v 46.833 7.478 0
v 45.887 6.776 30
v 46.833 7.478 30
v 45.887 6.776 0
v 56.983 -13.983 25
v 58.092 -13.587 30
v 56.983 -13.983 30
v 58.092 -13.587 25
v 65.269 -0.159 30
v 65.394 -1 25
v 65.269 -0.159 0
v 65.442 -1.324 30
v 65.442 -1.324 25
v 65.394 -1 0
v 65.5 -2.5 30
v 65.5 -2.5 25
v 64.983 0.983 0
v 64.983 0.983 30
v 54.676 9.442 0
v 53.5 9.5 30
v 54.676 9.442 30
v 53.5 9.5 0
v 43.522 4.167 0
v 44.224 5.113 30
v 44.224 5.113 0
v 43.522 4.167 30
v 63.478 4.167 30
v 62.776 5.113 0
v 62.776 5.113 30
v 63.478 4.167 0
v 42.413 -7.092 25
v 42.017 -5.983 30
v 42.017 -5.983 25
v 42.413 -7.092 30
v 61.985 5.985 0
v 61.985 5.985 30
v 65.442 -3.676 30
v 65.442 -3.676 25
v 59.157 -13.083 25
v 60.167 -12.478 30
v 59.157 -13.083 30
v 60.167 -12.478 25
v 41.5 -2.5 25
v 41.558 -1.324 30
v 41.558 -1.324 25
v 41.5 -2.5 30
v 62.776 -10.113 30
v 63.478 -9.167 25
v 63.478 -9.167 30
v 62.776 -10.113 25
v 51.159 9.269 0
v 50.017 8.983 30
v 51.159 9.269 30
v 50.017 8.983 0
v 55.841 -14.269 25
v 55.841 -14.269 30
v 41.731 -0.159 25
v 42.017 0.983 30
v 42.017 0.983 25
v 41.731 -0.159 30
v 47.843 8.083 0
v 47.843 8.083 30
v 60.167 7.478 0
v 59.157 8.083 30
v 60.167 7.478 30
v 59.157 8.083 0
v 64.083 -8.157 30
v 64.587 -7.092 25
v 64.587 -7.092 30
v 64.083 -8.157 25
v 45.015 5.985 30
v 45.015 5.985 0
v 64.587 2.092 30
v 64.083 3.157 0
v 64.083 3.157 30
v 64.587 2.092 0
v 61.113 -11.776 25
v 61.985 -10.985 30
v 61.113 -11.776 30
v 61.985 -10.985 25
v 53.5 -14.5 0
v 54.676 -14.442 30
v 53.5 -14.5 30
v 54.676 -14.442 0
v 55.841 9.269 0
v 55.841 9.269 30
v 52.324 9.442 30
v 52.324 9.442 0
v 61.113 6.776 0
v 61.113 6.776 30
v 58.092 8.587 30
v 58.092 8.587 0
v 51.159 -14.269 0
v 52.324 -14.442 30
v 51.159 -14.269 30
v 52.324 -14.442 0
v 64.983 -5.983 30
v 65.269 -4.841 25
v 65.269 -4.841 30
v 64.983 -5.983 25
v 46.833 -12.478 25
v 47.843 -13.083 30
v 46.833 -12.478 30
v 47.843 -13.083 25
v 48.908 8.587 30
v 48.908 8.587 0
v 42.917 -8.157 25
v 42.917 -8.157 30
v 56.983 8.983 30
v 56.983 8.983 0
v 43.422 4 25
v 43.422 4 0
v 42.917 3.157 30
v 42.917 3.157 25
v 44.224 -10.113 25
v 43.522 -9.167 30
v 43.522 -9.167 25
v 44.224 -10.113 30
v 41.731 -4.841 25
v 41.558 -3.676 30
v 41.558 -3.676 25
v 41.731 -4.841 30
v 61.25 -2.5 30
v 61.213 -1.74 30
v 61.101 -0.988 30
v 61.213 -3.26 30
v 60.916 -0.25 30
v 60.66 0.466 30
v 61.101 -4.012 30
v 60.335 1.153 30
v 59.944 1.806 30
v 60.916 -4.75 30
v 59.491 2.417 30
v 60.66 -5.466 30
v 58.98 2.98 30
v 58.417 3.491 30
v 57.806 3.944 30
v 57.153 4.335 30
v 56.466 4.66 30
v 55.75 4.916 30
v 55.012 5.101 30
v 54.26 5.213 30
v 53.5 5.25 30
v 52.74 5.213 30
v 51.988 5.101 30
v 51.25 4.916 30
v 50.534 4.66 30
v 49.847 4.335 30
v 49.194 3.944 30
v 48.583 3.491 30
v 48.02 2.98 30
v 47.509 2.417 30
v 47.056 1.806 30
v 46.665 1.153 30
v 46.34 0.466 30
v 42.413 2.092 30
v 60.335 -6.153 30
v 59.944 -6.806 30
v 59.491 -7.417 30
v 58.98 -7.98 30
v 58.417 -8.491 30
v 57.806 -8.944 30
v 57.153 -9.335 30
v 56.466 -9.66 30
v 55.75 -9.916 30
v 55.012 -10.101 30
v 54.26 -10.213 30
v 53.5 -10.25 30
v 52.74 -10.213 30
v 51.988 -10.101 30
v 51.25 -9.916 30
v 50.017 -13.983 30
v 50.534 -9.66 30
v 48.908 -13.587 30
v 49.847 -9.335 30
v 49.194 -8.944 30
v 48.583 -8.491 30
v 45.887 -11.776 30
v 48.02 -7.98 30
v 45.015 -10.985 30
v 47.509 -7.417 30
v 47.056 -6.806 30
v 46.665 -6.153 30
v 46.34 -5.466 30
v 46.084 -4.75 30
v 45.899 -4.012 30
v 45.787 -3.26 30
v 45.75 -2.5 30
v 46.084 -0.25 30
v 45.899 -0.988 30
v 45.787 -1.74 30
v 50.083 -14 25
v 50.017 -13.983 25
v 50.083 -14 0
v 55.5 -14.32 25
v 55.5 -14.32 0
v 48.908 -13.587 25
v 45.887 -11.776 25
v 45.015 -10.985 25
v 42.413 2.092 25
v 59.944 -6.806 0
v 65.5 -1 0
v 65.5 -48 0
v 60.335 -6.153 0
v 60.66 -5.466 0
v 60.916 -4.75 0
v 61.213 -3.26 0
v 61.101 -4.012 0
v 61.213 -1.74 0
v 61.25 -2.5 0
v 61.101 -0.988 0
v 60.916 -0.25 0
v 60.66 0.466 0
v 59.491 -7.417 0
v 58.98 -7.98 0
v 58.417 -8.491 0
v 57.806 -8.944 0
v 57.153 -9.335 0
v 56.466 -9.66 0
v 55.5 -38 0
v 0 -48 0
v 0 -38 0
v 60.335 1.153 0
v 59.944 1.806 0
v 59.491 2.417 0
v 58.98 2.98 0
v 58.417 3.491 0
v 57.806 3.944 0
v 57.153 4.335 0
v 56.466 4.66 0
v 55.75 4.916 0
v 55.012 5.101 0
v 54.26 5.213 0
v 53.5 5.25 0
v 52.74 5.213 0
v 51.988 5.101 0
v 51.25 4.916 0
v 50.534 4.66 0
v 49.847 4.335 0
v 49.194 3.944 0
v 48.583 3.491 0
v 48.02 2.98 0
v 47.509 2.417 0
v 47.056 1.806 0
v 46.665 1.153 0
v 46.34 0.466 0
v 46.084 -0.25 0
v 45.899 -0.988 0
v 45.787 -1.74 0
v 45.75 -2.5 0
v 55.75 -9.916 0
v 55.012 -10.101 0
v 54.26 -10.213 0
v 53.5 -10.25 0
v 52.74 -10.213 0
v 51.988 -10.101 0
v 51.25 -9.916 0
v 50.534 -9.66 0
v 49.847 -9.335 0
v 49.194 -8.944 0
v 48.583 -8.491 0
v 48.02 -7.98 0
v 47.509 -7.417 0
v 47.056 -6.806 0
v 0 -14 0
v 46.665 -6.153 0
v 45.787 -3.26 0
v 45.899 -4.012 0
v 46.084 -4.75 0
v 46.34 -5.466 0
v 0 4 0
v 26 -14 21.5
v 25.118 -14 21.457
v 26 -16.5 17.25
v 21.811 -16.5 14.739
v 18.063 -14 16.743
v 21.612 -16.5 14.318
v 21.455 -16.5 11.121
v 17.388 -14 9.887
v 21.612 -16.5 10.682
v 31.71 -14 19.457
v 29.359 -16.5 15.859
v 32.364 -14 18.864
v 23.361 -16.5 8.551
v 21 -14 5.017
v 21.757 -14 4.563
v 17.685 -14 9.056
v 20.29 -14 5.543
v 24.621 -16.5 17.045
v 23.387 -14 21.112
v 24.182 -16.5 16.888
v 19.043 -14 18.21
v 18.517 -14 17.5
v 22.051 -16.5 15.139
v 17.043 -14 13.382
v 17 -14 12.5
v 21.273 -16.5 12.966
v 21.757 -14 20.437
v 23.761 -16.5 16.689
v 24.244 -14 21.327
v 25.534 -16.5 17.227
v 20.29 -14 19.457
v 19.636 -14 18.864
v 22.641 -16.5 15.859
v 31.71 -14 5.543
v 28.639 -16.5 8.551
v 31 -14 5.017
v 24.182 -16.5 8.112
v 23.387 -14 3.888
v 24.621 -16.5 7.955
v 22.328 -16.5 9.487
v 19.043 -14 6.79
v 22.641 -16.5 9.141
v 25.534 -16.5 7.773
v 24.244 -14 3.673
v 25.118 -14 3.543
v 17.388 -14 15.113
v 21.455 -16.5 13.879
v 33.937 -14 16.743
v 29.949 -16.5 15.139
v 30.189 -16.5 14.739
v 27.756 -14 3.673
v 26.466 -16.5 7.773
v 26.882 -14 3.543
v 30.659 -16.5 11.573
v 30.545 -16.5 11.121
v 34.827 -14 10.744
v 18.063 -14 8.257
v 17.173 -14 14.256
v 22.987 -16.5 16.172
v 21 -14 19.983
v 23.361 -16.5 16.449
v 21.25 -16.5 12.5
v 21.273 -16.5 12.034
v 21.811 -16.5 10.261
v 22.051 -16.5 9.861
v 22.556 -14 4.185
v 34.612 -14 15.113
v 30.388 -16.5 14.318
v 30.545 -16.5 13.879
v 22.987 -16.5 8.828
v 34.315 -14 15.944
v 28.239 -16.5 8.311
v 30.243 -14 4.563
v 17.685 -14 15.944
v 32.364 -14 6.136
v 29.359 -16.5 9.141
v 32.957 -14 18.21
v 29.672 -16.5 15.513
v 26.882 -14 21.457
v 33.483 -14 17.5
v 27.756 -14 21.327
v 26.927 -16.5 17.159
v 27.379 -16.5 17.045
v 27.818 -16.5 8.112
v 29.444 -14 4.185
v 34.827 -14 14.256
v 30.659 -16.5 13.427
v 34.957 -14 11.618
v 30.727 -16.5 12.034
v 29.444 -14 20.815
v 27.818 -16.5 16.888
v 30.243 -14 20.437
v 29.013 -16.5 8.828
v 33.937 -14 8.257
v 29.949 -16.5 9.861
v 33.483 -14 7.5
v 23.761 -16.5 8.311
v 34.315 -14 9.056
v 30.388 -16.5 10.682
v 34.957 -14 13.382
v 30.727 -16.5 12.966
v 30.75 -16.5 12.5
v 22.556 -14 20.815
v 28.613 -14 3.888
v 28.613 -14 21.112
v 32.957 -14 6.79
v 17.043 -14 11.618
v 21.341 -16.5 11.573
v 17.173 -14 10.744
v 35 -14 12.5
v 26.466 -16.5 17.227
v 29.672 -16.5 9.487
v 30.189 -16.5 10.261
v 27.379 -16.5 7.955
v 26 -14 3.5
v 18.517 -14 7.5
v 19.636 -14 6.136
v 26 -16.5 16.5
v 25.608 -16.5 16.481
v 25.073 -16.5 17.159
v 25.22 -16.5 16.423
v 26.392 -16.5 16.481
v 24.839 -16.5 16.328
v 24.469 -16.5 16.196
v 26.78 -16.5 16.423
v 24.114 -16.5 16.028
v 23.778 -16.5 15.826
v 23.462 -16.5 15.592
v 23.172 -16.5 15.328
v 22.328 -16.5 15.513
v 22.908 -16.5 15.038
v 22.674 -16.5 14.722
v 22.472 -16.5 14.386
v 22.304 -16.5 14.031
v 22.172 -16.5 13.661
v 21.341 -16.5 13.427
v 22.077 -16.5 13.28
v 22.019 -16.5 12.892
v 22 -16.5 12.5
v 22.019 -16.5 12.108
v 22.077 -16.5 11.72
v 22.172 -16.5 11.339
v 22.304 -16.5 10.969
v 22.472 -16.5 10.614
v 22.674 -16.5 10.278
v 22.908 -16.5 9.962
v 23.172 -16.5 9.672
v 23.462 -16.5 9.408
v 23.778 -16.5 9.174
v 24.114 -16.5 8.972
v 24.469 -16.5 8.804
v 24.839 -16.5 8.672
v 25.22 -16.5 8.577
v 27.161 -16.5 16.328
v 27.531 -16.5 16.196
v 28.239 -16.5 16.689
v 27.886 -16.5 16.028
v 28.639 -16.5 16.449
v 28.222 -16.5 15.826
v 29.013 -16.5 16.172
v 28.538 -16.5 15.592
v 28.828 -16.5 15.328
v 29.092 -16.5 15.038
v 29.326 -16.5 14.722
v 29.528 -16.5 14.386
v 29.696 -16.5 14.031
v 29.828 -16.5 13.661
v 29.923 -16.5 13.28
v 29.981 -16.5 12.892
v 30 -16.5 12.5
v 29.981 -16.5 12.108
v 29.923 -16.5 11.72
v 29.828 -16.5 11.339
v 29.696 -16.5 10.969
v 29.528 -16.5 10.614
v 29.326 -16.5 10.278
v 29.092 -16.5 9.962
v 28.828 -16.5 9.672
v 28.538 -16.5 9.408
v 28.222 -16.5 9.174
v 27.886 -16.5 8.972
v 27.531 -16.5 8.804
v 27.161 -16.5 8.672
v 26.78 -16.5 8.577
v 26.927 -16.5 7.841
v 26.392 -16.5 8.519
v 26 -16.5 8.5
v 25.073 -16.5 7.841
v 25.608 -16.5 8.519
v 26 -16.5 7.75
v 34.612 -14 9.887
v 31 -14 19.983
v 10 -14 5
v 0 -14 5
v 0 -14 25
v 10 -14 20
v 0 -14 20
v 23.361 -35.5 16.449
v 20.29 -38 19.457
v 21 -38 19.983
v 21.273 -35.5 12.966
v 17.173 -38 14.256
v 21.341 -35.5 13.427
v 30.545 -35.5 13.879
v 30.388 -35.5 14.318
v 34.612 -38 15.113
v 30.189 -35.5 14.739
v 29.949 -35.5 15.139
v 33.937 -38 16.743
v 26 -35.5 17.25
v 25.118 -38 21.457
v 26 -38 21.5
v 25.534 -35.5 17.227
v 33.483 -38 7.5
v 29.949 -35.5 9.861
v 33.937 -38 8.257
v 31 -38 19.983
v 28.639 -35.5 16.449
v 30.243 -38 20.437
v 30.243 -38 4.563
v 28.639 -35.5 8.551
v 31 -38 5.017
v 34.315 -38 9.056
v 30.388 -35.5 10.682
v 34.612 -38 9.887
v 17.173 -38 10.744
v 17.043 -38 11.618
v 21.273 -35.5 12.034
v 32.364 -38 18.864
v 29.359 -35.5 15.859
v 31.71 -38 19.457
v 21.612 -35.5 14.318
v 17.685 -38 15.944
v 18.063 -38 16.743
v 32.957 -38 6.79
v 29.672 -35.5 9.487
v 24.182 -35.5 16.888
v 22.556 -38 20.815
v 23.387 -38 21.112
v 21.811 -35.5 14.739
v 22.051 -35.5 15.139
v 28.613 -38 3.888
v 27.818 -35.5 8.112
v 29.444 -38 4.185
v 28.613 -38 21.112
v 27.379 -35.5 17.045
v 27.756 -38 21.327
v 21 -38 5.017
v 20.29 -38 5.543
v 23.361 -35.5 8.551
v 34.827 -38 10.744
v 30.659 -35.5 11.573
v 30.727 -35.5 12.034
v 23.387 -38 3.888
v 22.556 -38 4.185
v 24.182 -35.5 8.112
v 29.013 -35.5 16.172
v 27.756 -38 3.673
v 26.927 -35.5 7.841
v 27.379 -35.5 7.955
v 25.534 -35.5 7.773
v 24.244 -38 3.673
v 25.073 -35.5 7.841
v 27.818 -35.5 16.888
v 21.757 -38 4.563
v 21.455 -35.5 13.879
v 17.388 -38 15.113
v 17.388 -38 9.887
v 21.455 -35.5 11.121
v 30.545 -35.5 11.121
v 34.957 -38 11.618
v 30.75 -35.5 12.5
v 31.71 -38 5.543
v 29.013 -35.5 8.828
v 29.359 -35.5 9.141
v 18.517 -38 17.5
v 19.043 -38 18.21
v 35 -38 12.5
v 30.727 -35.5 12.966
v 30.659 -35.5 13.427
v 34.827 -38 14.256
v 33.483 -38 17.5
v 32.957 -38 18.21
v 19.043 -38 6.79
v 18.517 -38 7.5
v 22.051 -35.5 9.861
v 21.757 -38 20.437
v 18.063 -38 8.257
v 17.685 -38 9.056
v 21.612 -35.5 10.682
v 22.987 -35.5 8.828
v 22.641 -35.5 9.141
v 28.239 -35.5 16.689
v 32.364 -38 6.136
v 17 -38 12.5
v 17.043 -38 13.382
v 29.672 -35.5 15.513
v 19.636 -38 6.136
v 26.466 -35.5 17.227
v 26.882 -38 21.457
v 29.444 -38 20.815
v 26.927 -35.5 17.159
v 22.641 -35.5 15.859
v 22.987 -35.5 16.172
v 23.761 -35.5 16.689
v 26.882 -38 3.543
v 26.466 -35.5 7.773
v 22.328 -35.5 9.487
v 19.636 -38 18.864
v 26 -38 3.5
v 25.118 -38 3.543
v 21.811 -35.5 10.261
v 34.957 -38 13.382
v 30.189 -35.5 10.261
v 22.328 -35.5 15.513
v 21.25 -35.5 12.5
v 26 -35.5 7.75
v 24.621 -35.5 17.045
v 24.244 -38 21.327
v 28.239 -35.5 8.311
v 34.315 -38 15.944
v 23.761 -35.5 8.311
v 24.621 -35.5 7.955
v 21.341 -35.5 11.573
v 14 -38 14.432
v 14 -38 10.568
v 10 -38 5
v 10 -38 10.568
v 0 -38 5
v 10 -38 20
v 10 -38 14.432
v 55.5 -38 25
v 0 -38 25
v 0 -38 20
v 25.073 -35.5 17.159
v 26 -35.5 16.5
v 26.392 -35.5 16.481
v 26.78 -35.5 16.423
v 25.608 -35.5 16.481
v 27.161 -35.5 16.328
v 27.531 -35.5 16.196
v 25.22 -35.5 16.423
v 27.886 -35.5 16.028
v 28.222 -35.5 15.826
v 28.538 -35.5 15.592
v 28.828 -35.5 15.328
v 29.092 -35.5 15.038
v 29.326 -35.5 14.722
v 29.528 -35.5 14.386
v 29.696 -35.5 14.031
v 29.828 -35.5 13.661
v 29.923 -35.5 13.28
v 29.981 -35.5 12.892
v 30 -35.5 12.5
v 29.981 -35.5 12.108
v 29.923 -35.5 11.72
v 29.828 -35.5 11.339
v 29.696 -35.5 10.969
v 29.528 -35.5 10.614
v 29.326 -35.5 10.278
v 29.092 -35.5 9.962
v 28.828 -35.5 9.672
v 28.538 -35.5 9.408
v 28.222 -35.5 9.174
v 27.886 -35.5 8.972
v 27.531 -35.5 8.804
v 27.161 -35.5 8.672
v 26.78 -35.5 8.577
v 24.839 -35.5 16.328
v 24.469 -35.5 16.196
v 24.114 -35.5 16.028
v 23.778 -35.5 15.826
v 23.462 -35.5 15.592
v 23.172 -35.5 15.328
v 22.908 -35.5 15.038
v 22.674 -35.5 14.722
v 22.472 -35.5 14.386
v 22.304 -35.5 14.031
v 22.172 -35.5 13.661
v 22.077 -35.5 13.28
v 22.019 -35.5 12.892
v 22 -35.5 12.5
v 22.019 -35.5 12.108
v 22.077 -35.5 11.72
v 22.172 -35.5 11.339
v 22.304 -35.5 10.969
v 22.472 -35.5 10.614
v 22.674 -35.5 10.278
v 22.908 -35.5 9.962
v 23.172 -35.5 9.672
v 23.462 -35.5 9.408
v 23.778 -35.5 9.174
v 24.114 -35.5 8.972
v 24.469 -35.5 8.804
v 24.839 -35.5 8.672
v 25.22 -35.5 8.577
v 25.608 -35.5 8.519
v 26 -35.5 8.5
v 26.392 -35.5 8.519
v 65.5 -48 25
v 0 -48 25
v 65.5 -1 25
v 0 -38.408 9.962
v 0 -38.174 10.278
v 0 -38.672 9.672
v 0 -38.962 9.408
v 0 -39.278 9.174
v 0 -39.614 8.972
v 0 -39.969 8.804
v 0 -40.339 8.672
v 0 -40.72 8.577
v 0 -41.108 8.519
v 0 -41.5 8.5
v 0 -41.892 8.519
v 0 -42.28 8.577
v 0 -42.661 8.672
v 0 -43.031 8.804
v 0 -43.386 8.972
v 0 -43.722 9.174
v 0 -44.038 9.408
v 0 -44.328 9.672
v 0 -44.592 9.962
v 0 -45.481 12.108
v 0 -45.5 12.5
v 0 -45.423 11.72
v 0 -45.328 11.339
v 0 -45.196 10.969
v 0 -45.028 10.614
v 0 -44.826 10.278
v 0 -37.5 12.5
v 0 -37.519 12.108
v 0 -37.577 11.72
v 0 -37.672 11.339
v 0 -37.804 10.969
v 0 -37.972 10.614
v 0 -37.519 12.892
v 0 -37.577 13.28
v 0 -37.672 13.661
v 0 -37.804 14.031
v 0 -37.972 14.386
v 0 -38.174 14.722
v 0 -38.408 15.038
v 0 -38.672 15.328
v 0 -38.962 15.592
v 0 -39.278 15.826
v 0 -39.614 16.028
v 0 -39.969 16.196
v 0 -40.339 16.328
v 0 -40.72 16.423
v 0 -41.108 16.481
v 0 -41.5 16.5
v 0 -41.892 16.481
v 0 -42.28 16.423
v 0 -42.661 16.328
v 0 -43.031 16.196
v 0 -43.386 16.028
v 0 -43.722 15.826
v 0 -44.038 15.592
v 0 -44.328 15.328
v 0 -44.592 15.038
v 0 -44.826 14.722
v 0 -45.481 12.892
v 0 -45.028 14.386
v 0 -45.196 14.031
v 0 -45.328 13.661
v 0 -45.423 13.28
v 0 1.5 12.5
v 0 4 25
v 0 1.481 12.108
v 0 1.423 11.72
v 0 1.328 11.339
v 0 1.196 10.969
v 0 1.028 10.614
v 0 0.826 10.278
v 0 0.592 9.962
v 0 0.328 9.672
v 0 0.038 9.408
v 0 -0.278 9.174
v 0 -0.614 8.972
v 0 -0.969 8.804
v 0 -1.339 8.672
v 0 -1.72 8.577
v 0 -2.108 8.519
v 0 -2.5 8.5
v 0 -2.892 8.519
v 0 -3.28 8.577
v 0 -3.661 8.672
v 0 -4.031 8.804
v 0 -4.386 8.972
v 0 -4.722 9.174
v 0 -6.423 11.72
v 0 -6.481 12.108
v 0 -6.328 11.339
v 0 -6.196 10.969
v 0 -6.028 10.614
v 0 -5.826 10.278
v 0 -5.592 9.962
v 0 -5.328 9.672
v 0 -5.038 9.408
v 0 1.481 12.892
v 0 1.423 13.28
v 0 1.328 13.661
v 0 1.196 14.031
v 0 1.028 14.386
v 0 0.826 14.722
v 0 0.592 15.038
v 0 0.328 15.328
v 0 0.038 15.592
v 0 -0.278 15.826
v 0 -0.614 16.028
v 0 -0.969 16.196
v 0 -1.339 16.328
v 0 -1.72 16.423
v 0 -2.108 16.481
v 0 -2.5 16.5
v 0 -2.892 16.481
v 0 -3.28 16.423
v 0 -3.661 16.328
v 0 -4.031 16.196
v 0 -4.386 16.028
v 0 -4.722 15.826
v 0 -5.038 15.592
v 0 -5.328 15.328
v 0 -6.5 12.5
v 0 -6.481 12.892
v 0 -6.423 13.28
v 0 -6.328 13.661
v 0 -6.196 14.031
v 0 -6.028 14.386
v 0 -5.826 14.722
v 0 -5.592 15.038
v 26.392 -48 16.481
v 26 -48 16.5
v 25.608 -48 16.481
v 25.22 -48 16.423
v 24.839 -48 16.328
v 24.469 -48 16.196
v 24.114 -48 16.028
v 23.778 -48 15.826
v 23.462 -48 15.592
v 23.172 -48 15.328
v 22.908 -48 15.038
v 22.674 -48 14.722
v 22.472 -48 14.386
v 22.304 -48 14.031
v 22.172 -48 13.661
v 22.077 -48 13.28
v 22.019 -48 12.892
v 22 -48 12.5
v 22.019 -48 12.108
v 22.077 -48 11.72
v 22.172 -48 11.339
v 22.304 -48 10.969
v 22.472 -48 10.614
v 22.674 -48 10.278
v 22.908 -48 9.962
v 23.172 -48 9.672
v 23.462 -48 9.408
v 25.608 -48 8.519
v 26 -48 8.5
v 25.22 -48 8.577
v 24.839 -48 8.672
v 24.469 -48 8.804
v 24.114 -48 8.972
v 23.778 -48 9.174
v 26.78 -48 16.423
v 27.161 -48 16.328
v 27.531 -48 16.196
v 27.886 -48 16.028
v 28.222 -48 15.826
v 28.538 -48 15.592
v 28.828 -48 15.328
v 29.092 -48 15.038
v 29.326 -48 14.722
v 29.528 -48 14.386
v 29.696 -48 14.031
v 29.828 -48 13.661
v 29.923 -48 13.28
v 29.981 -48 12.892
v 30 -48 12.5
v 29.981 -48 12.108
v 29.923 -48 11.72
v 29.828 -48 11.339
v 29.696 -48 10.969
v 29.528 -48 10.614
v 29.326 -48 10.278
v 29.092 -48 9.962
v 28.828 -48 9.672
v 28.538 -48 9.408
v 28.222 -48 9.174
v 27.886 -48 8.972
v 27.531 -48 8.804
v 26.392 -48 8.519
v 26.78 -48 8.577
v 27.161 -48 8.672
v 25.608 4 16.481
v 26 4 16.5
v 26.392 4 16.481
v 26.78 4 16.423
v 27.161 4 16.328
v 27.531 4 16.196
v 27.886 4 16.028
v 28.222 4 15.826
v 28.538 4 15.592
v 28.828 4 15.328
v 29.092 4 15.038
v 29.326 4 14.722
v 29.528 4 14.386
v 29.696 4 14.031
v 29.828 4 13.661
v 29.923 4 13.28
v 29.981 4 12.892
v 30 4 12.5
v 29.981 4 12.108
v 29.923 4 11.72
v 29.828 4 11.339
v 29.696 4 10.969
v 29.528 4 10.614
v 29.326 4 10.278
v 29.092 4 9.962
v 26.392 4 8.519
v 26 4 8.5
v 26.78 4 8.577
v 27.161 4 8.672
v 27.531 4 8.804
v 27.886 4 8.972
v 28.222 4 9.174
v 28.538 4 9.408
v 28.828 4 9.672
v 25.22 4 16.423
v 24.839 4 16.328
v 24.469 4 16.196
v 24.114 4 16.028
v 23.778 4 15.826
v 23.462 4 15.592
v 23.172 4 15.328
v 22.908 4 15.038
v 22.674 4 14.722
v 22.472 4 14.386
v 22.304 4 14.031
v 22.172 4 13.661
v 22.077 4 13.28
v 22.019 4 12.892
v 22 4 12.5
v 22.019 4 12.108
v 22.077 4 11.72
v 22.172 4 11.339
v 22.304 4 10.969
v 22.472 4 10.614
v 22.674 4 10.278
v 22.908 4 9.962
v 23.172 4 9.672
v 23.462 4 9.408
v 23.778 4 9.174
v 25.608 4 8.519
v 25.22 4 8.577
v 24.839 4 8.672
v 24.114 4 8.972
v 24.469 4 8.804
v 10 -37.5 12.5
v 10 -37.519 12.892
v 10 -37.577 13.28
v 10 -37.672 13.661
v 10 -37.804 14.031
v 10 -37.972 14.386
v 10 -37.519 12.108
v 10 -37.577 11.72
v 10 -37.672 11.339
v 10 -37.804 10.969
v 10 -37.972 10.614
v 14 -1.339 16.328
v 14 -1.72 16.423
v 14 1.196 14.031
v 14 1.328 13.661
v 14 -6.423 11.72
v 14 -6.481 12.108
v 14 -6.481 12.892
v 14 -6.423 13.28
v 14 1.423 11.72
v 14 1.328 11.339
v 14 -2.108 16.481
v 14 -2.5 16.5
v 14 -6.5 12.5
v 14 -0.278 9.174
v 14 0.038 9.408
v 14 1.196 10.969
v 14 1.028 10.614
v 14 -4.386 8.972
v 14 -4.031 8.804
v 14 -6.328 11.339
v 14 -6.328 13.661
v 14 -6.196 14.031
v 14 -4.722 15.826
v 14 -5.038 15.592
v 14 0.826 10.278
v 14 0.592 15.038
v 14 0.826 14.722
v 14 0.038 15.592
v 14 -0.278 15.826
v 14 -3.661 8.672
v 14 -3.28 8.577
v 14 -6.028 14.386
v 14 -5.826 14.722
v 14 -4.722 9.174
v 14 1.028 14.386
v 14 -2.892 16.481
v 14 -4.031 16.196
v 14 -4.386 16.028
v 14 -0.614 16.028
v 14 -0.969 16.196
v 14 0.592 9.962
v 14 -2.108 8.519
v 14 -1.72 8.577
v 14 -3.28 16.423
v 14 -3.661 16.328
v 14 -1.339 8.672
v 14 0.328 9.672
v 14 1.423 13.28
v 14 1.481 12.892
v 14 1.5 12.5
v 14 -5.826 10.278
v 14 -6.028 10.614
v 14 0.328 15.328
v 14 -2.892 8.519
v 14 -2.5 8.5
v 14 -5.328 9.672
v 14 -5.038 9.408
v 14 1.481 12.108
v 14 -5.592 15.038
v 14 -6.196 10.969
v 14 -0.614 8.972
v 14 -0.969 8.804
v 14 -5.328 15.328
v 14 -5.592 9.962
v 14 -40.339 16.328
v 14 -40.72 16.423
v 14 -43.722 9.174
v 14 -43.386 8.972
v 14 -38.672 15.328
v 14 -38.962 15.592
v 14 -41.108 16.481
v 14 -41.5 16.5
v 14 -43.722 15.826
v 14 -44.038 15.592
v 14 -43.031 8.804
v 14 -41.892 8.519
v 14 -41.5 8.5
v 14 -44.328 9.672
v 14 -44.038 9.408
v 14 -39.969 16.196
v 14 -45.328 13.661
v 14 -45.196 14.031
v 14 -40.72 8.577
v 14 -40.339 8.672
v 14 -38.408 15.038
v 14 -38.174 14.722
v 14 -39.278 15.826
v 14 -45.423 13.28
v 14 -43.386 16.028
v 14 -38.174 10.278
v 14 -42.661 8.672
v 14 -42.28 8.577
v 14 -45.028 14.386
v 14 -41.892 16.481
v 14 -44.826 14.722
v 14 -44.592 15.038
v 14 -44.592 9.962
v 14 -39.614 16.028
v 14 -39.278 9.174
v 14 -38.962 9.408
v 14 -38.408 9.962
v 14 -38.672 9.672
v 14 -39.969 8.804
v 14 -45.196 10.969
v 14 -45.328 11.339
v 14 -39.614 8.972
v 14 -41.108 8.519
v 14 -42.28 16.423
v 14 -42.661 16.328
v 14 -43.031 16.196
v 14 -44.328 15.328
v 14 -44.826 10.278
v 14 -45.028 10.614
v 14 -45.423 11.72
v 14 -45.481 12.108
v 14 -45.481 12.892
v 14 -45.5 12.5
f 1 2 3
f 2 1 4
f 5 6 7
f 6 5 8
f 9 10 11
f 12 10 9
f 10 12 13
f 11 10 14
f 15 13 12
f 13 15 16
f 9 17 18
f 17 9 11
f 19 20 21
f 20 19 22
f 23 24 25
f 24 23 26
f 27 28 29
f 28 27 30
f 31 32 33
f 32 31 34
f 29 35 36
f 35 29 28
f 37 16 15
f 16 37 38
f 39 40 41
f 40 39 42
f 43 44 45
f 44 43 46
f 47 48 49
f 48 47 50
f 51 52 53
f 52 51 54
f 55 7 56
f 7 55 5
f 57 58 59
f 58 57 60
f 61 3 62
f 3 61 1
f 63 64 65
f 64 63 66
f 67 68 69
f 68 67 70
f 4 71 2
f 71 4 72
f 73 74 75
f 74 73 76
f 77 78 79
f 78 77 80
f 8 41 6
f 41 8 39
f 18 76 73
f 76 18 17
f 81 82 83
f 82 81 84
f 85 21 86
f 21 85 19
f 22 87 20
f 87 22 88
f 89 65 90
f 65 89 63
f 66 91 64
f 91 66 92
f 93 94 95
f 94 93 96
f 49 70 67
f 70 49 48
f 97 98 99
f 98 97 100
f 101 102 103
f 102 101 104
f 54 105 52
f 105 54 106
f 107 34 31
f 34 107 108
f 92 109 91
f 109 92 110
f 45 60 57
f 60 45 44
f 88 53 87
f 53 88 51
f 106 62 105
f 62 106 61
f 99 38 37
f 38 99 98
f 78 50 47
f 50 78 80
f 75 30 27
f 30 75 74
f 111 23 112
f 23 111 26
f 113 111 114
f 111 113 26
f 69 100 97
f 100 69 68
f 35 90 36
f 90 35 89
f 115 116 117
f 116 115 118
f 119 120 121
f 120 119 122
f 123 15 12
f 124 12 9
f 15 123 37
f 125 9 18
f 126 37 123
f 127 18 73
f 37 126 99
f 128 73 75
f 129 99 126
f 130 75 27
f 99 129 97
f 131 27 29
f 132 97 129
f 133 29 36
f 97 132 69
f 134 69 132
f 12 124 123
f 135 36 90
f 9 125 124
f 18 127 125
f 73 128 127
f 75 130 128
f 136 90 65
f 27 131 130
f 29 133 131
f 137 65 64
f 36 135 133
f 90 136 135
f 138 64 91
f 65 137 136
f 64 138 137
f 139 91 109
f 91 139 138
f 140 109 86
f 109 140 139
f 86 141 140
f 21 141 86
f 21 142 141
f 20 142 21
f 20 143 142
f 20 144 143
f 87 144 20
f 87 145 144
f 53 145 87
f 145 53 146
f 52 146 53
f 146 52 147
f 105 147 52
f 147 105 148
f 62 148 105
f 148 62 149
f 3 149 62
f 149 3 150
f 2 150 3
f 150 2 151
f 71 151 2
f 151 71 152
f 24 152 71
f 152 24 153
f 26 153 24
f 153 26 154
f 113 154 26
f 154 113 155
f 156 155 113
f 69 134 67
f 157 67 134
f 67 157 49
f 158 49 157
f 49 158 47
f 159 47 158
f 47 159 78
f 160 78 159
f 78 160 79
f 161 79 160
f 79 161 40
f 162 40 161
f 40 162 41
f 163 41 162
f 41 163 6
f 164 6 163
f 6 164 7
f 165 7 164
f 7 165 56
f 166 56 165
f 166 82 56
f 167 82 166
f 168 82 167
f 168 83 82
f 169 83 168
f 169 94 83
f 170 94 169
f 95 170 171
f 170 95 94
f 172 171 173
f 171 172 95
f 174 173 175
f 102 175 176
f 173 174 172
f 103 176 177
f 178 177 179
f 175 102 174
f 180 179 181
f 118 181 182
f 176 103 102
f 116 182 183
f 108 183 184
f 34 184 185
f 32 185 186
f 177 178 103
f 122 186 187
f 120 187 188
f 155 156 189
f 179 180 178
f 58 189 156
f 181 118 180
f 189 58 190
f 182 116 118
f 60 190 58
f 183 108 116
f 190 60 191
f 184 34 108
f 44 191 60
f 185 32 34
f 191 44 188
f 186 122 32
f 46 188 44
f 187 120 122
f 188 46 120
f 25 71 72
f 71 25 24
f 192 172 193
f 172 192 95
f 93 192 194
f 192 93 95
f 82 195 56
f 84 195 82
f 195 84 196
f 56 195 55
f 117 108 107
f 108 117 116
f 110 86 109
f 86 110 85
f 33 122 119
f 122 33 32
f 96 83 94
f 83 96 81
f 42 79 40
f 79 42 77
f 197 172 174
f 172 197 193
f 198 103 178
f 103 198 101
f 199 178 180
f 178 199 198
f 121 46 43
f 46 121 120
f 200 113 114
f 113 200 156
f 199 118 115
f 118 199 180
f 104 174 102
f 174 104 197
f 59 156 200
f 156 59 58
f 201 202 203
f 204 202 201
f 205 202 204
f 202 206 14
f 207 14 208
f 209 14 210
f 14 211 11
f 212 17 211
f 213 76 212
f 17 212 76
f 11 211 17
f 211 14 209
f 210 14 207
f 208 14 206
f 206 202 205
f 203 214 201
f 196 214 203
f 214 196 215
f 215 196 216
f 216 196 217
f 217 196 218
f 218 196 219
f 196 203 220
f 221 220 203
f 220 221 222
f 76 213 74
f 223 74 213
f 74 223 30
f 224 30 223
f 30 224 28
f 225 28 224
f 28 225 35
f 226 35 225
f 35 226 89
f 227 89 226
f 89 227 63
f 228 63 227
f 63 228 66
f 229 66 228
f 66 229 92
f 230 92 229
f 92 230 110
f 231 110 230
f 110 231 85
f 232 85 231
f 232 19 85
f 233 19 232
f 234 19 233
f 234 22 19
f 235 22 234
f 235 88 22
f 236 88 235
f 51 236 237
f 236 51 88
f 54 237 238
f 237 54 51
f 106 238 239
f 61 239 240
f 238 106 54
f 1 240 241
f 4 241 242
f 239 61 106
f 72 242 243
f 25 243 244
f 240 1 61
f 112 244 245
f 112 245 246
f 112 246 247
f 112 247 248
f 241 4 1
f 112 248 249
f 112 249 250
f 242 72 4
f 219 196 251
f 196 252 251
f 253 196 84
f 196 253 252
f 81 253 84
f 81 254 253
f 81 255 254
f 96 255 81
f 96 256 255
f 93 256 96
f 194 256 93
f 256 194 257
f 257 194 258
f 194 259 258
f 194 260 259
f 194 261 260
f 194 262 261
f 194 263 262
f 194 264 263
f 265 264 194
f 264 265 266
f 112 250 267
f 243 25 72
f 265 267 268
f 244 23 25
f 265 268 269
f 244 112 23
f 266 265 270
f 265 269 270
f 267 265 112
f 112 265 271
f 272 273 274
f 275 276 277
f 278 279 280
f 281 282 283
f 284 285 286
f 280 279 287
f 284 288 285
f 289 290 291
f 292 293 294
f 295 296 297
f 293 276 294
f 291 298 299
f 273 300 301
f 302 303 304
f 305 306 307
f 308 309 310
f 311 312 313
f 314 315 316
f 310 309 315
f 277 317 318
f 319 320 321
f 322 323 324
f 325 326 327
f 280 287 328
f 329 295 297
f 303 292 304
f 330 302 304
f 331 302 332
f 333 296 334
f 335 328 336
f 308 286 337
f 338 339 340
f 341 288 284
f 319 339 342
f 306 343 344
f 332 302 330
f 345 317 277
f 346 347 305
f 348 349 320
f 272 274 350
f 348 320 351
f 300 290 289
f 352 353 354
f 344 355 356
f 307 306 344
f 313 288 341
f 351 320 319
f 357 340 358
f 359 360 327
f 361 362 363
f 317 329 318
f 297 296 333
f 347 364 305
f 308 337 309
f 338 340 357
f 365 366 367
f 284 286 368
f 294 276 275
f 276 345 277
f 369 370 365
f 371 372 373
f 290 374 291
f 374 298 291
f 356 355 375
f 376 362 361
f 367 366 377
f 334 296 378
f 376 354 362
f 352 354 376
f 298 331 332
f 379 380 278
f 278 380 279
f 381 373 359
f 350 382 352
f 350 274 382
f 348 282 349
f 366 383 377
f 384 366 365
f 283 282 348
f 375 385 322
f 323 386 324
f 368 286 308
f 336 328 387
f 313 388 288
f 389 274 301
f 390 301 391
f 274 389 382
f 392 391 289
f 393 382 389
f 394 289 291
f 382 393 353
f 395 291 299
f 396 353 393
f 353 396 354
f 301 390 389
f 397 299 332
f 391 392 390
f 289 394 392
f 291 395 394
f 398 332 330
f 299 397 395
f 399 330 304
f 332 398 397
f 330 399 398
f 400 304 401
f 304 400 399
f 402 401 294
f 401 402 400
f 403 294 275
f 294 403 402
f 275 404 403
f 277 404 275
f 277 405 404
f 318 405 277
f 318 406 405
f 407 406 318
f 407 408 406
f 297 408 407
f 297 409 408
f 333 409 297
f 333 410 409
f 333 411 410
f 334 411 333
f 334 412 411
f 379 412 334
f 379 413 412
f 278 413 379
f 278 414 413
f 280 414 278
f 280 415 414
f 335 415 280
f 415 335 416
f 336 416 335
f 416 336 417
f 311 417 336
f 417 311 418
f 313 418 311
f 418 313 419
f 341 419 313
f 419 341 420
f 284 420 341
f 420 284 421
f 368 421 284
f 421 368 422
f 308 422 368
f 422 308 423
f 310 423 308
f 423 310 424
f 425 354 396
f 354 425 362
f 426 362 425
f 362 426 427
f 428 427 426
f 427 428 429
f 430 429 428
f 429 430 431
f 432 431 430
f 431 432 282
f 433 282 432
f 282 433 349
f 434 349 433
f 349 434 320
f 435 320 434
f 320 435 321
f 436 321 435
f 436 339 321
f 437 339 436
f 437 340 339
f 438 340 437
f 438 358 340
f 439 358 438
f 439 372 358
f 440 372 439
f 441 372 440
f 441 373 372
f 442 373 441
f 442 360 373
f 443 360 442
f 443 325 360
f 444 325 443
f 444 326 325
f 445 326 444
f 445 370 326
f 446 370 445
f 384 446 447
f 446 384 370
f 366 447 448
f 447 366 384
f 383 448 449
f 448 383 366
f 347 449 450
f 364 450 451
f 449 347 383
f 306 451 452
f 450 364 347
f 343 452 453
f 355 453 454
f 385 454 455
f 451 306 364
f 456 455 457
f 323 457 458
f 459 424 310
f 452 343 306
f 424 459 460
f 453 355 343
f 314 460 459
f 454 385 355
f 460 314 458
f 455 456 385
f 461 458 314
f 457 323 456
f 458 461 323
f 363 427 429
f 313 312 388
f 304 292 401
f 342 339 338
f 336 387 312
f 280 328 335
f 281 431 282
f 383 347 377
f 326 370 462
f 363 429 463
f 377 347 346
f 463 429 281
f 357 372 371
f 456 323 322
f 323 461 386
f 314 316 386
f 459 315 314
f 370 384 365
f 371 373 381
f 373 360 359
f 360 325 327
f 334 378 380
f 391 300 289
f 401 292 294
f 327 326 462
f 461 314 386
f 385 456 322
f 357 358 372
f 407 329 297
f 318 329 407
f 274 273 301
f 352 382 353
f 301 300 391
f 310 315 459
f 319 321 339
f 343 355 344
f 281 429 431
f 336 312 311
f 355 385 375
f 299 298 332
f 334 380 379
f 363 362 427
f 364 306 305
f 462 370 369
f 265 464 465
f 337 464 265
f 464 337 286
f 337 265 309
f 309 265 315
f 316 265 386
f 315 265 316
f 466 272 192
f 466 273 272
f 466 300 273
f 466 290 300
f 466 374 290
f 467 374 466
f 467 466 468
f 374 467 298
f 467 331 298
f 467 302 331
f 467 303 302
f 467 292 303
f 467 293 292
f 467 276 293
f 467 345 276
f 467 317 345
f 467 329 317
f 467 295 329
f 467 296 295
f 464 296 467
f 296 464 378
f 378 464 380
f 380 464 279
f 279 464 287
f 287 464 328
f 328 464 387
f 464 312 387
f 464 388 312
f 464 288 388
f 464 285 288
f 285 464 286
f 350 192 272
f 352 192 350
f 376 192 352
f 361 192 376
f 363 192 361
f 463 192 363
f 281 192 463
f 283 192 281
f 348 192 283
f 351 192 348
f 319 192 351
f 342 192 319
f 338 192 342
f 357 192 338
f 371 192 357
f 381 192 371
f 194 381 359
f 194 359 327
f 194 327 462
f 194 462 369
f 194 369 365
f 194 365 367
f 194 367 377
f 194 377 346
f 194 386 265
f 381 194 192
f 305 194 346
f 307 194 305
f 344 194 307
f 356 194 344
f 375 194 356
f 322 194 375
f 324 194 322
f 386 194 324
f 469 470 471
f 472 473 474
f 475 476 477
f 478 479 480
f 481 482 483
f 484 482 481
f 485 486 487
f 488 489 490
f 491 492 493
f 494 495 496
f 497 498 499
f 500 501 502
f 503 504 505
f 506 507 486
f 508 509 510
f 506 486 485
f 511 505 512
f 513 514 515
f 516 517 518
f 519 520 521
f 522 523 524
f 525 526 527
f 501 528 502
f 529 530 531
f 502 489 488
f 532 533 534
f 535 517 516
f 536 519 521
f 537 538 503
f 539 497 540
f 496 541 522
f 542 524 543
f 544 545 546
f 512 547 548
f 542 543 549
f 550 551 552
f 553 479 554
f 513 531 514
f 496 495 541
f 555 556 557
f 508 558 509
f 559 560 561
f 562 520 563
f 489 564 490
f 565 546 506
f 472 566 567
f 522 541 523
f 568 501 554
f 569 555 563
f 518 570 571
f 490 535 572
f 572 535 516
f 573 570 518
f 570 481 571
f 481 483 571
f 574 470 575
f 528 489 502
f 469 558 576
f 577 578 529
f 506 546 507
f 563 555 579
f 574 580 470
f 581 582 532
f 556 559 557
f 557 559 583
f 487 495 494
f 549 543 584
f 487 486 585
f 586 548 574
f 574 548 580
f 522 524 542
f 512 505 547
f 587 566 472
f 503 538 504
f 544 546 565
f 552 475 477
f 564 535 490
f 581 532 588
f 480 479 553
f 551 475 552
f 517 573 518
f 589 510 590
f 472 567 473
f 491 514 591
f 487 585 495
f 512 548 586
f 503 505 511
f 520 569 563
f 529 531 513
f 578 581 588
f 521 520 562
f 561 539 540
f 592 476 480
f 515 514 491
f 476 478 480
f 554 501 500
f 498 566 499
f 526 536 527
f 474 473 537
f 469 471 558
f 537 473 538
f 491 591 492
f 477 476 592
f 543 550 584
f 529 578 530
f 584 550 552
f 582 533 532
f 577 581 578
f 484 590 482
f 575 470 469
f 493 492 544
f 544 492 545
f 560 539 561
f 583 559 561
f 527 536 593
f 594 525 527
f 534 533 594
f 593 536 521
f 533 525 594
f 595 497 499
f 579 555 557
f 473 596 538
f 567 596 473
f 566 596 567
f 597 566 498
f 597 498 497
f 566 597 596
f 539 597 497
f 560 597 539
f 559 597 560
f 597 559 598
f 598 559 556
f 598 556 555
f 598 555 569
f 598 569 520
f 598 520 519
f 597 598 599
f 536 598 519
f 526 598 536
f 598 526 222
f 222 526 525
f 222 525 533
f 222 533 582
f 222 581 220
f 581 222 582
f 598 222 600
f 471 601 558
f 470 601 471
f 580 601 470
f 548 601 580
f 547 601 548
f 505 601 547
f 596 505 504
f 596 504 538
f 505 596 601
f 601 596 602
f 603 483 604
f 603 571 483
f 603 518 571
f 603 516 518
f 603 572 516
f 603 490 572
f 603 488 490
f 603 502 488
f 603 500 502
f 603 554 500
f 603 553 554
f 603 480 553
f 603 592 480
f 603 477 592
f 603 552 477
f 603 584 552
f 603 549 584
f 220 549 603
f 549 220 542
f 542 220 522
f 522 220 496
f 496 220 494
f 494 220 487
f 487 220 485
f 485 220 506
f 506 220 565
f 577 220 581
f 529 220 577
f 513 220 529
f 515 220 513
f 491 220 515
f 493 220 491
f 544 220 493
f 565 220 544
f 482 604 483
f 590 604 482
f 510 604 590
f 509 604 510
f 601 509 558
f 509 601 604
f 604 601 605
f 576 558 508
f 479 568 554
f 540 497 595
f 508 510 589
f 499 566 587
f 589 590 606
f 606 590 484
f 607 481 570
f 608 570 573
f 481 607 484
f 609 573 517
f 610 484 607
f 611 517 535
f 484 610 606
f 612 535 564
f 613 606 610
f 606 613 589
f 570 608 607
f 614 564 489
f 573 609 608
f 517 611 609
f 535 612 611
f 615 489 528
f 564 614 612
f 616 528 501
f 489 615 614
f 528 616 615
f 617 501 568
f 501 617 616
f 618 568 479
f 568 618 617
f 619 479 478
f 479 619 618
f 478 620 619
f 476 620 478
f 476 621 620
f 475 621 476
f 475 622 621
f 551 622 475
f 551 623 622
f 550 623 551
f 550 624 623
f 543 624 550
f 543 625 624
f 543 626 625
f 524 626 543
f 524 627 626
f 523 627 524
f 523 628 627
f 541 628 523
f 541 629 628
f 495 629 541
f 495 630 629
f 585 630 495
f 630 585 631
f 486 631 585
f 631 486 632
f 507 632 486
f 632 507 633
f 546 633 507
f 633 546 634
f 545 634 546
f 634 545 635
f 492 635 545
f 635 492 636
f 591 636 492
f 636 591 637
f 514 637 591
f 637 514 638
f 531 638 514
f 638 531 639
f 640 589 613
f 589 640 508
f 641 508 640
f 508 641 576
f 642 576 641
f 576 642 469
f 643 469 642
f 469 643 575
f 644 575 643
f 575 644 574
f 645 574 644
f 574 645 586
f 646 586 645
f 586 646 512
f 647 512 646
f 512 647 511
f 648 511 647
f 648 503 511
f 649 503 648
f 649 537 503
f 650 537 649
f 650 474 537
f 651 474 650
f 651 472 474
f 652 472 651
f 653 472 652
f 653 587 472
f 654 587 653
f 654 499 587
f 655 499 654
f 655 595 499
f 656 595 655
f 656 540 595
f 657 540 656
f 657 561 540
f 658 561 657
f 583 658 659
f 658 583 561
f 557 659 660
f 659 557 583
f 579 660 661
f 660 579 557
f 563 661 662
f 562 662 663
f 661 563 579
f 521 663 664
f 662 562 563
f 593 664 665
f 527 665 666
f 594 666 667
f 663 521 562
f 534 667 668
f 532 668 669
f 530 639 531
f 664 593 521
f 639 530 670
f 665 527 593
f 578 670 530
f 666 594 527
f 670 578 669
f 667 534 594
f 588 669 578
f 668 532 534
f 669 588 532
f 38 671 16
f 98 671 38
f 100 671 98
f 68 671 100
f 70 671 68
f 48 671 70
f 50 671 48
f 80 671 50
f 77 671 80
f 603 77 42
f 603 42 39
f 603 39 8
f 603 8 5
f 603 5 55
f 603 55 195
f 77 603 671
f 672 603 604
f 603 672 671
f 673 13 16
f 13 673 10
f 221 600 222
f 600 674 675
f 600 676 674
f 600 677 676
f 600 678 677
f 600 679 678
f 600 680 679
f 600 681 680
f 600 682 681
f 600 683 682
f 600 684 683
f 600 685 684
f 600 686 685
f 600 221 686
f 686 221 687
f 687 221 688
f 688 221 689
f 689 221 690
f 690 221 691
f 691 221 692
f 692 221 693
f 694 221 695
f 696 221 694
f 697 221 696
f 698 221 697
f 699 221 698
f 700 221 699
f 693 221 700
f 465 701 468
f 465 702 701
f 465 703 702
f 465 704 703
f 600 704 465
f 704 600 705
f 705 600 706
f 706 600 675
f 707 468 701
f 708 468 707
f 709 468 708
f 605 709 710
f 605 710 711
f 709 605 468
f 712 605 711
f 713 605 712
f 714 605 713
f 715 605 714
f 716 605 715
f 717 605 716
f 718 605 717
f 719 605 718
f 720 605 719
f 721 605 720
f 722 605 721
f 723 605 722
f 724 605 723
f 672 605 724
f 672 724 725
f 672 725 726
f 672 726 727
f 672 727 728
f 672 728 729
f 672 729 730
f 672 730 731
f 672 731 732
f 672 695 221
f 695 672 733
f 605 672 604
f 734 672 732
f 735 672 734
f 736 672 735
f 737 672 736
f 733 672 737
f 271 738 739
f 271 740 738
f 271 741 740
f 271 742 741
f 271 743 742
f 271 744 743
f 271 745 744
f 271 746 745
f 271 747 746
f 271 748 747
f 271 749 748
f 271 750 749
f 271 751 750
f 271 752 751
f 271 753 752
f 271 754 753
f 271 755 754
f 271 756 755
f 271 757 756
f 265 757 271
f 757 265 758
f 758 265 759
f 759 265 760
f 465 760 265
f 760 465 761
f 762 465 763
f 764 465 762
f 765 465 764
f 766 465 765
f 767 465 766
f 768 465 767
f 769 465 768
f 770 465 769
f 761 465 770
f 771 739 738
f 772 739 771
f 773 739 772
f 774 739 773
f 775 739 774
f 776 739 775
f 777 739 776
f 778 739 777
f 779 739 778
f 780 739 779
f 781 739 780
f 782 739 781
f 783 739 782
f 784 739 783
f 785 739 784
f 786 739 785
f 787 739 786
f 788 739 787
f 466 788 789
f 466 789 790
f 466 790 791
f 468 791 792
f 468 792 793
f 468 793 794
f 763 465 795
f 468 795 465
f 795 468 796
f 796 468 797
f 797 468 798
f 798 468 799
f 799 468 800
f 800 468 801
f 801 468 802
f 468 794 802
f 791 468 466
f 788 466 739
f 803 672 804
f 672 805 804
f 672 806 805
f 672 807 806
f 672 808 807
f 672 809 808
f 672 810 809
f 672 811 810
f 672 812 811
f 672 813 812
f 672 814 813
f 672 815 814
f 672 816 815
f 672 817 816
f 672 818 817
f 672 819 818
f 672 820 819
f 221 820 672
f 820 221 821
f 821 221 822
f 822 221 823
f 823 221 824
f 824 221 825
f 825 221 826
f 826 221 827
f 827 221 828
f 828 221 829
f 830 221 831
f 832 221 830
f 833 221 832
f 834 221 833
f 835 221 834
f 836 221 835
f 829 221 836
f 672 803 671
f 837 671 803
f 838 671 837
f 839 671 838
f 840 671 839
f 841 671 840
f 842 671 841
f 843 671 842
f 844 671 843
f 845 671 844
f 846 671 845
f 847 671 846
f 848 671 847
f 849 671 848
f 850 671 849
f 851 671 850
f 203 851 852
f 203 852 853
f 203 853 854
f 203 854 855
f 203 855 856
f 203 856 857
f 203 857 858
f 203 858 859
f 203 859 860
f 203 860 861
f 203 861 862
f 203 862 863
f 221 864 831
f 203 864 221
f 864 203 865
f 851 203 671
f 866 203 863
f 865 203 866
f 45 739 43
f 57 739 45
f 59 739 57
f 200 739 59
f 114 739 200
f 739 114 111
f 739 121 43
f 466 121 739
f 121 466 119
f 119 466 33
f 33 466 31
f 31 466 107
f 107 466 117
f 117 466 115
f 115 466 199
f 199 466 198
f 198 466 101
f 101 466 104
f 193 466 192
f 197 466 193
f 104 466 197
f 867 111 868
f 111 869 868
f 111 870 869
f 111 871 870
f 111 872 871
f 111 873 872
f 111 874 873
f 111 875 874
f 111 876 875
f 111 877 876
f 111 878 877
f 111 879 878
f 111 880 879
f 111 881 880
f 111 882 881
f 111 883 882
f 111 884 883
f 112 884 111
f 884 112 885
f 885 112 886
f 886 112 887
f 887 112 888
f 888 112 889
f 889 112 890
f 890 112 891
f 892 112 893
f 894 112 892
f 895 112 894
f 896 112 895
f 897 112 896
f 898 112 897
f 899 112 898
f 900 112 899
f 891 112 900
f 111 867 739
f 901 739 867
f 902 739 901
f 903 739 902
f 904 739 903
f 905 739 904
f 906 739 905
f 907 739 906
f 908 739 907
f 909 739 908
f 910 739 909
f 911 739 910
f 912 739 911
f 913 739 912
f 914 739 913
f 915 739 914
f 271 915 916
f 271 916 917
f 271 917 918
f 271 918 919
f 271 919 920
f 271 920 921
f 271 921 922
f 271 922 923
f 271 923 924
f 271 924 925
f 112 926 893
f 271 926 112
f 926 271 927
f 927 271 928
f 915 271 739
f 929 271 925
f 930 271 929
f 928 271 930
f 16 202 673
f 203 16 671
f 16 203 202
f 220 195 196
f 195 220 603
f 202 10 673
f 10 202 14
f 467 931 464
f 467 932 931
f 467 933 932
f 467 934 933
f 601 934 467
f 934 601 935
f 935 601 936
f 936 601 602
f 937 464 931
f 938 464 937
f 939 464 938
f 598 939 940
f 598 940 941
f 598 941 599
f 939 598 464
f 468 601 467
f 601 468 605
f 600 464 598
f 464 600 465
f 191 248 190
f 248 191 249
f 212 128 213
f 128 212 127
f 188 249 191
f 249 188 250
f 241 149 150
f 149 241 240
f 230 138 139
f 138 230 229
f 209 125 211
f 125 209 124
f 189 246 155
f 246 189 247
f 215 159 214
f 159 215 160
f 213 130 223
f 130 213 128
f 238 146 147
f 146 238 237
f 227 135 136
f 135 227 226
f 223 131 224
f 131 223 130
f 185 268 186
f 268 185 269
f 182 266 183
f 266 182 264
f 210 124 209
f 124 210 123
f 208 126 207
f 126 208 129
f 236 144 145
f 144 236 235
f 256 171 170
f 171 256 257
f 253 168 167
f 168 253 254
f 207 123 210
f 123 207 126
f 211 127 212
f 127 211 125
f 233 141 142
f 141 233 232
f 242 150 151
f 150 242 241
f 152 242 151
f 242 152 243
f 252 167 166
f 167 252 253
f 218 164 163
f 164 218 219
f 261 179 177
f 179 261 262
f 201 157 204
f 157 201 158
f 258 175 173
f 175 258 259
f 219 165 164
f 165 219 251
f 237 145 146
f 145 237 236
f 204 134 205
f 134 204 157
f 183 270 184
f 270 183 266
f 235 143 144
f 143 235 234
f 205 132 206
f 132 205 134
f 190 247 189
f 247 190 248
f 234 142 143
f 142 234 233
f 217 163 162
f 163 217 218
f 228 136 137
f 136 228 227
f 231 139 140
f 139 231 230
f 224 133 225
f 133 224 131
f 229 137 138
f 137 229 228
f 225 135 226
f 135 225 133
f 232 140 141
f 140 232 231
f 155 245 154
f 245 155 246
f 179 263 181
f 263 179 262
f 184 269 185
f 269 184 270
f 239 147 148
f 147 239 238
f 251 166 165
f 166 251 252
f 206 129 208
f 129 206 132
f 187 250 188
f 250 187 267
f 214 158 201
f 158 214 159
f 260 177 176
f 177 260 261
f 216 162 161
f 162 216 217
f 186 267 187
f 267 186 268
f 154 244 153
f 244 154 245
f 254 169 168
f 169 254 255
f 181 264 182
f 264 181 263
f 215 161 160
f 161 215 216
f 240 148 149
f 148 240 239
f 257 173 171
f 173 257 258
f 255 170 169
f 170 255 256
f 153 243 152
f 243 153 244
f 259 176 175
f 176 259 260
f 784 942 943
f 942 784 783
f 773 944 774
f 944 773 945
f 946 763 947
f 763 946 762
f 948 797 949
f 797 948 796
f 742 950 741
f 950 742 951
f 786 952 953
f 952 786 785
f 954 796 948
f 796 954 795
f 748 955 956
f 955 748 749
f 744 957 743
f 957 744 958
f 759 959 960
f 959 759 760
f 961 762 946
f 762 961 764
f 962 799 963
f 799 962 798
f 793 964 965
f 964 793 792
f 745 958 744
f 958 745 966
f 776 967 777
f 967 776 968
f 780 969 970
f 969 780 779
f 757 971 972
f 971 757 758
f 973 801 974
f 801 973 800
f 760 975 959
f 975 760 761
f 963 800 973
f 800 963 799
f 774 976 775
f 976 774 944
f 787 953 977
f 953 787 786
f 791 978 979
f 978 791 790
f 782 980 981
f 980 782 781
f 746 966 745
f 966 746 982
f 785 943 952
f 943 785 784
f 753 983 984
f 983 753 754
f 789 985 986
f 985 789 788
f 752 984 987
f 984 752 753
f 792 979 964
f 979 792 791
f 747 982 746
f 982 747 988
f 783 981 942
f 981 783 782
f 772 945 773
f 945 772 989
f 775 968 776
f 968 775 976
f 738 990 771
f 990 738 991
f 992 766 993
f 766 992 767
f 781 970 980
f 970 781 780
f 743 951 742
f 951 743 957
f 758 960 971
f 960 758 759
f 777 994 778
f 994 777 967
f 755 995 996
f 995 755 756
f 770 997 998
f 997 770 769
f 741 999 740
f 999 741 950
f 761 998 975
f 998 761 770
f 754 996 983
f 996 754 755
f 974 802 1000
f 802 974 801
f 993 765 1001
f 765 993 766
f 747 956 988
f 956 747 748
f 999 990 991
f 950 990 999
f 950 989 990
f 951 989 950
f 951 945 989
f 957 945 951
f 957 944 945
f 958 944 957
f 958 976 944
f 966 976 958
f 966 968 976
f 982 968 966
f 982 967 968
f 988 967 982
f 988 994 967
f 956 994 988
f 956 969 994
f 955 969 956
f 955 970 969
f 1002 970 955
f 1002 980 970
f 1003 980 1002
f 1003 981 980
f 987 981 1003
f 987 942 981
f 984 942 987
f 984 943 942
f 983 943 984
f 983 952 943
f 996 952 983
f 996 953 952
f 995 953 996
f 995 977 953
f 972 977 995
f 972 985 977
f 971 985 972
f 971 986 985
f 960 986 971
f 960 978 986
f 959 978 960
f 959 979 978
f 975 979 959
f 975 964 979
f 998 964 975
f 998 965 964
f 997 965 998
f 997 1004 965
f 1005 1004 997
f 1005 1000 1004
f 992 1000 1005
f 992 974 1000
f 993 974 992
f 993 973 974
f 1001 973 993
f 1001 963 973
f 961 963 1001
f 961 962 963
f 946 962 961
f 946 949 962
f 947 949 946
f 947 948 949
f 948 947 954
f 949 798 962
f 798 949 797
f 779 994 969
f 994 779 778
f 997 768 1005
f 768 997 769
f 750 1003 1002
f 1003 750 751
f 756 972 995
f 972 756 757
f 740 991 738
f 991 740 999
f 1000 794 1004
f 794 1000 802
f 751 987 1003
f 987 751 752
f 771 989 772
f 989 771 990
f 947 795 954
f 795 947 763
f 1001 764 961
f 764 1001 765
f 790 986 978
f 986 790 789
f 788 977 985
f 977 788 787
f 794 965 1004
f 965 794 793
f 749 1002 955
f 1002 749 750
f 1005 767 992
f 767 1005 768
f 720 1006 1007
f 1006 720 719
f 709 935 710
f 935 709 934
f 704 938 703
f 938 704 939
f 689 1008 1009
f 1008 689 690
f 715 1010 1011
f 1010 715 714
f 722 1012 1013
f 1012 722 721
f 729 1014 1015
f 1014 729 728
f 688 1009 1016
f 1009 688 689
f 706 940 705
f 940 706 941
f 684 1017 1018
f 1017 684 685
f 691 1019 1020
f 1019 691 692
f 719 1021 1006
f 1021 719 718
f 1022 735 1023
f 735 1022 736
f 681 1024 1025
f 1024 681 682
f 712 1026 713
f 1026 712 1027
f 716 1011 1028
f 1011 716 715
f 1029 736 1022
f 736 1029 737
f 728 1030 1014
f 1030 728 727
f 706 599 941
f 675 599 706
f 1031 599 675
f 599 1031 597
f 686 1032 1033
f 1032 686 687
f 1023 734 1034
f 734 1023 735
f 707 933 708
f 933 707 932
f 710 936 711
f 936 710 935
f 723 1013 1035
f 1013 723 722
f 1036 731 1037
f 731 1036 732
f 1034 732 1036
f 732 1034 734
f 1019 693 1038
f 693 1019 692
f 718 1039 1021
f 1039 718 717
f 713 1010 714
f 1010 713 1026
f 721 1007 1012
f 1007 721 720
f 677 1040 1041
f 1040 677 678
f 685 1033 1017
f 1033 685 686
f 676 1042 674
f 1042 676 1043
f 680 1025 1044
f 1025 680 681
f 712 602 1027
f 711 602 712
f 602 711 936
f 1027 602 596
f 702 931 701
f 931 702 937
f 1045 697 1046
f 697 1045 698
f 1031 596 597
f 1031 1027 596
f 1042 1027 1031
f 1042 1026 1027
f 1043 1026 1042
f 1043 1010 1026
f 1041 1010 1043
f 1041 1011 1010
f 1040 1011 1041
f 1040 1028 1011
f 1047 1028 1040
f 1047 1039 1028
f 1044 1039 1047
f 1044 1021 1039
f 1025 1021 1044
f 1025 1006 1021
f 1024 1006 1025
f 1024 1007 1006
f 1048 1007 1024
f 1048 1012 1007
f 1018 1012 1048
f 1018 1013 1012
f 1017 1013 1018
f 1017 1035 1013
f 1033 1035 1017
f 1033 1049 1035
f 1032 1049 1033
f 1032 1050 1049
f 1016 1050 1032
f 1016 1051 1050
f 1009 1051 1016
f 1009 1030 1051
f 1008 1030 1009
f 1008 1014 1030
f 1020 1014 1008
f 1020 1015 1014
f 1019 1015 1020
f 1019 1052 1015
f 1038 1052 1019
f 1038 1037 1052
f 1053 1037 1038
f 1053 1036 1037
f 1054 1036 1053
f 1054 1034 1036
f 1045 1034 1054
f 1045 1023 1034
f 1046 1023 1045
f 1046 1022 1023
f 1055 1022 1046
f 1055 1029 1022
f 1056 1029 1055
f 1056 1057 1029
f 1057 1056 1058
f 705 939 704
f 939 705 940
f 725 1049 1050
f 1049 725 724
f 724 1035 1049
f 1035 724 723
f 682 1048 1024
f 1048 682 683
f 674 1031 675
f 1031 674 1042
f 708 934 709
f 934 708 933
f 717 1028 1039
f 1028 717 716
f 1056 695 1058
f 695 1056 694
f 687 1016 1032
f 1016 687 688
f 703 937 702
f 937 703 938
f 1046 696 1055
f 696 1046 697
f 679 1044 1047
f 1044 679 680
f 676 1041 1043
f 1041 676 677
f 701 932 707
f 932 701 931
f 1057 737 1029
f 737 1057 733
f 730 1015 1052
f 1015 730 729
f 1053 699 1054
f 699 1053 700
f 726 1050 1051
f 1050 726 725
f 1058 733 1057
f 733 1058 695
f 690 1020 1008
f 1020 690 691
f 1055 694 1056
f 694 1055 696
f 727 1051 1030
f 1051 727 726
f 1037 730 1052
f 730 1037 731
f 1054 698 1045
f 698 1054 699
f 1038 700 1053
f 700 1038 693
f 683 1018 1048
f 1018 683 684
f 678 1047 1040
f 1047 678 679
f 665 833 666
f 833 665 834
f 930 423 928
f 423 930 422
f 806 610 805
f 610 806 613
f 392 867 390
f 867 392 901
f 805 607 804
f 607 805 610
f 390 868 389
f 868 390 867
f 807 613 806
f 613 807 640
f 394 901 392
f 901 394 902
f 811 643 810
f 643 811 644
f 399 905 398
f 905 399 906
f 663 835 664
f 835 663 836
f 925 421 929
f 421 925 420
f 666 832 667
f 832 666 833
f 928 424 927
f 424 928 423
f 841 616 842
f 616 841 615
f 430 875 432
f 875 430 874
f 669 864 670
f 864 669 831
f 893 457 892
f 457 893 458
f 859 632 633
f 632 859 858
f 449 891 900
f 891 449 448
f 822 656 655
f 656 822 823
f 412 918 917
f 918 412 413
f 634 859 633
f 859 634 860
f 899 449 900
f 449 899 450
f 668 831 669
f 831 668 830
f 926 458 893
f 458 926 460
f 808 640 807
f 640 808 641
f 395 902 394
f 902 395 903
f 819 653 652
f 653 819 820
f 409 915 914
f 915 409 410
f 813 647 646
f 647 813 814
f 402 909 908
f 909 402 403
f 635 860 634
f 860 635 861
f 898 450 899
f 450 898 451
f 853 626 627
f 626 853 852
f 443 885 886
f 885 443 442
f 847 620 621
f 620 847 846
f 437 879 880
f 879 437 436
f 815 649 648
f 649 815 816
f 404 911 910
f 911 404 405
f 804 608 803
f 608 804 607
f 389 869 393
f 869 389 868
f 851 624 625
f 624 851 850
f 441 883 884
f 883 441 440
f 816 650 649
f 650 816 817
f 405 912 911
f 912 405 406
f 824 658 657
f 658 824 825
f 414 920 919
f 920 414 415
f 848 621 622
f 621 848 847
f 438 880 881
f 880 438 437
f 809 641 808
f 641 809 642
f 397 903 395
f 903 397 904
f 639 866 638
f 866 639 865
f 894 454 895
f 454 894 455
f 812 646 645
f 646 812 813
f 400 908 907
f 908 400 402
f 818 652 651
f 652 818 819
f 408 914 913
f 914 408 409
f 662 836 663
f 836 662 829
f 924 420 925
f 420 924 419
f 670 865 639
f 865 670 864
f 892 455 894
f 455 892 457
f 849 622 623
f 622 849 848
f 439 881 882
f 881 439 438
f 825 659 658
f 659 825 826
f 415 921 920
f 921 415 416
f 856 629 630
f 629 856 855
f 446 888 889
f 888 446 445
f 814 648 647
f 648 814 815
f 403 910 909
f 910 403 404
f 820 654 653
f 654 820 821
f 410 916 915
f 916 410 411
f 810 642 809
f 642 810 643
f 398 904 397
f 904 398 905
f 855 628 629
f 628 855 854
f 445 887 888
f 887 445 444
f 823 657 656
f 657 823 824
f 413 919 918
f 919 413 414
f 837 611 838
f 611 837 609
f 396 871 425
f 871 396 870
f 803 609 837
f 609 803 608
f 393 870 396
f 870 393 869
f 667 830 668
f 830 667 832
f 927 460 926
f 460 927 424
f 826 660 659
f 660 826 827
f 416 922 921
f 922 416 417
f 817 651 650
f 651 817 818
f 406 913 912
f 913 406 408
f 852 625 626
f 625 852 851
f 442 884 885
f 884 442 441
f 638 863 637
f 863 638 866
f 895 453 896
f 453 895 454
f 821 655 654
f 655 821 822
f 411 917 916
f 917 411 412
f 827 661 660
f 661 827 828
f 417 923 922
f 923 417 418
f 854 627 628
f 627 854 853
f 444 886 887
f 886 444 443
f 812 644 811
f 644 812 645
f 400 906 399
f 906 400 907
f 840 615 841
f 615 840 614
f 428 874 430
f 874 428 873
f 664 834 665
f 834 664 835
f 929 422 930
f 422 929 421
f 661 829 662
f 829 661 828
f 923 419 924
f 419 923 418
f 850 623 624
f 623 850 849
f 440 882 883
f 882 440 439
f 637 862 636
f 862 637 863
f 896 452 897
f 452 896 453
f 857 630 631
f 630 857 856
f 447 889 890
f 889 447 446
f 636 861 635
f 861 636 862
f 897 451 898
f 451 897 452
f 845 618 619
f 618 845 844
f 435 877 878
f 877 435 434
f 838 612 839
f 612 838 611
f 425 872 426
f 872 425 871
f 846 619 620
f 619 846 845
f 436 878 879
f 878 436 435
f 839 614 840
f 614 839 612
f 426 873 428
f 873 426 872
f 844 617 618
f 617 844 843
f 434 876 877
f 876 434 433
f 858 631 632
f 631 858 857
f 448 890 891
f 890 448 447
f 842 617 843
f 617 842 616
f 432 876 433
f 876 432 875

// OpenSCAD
//#translate([98.45,-96.11,0])import("patin.stl");
$fn=64;
difference(){
union(){
translate([53.5,-2.5,0])cylinder(r=24/2,h=30);
translate([26,-14,25/2])rotate([0,3*90,90])cylinder(r1=18/2,r2=9.5/2,h=2.5);
translate([26,-14-21.5,25/2])rotate([0,3*90,90])cylinder(r2=18/2,r1=9.5/2,h=2.5);
translate([0,-44-4,0])cube([57,10,25]);
translate([0,-14,0])cube([55,18,25]);
translate([55.5,-48,0])cube([10,47,25]);
translate([0,-44,5])cube([10,44,15]);
}
translate([53.5,-2.5,-5])cylinder(r=15.5/2,h=40);
translate([14,-2.5,25/2])rotate([0,3*90,0])cylinder(r=8/2,h=30);
translate([14,-2.5-39,25/2])rotate([0,3*90,0])cylinder(r=8/2,h=30);
translate([26,20,25/2])rotate([0,3*90,90])cylinder(r=8/2,h=80);

}
